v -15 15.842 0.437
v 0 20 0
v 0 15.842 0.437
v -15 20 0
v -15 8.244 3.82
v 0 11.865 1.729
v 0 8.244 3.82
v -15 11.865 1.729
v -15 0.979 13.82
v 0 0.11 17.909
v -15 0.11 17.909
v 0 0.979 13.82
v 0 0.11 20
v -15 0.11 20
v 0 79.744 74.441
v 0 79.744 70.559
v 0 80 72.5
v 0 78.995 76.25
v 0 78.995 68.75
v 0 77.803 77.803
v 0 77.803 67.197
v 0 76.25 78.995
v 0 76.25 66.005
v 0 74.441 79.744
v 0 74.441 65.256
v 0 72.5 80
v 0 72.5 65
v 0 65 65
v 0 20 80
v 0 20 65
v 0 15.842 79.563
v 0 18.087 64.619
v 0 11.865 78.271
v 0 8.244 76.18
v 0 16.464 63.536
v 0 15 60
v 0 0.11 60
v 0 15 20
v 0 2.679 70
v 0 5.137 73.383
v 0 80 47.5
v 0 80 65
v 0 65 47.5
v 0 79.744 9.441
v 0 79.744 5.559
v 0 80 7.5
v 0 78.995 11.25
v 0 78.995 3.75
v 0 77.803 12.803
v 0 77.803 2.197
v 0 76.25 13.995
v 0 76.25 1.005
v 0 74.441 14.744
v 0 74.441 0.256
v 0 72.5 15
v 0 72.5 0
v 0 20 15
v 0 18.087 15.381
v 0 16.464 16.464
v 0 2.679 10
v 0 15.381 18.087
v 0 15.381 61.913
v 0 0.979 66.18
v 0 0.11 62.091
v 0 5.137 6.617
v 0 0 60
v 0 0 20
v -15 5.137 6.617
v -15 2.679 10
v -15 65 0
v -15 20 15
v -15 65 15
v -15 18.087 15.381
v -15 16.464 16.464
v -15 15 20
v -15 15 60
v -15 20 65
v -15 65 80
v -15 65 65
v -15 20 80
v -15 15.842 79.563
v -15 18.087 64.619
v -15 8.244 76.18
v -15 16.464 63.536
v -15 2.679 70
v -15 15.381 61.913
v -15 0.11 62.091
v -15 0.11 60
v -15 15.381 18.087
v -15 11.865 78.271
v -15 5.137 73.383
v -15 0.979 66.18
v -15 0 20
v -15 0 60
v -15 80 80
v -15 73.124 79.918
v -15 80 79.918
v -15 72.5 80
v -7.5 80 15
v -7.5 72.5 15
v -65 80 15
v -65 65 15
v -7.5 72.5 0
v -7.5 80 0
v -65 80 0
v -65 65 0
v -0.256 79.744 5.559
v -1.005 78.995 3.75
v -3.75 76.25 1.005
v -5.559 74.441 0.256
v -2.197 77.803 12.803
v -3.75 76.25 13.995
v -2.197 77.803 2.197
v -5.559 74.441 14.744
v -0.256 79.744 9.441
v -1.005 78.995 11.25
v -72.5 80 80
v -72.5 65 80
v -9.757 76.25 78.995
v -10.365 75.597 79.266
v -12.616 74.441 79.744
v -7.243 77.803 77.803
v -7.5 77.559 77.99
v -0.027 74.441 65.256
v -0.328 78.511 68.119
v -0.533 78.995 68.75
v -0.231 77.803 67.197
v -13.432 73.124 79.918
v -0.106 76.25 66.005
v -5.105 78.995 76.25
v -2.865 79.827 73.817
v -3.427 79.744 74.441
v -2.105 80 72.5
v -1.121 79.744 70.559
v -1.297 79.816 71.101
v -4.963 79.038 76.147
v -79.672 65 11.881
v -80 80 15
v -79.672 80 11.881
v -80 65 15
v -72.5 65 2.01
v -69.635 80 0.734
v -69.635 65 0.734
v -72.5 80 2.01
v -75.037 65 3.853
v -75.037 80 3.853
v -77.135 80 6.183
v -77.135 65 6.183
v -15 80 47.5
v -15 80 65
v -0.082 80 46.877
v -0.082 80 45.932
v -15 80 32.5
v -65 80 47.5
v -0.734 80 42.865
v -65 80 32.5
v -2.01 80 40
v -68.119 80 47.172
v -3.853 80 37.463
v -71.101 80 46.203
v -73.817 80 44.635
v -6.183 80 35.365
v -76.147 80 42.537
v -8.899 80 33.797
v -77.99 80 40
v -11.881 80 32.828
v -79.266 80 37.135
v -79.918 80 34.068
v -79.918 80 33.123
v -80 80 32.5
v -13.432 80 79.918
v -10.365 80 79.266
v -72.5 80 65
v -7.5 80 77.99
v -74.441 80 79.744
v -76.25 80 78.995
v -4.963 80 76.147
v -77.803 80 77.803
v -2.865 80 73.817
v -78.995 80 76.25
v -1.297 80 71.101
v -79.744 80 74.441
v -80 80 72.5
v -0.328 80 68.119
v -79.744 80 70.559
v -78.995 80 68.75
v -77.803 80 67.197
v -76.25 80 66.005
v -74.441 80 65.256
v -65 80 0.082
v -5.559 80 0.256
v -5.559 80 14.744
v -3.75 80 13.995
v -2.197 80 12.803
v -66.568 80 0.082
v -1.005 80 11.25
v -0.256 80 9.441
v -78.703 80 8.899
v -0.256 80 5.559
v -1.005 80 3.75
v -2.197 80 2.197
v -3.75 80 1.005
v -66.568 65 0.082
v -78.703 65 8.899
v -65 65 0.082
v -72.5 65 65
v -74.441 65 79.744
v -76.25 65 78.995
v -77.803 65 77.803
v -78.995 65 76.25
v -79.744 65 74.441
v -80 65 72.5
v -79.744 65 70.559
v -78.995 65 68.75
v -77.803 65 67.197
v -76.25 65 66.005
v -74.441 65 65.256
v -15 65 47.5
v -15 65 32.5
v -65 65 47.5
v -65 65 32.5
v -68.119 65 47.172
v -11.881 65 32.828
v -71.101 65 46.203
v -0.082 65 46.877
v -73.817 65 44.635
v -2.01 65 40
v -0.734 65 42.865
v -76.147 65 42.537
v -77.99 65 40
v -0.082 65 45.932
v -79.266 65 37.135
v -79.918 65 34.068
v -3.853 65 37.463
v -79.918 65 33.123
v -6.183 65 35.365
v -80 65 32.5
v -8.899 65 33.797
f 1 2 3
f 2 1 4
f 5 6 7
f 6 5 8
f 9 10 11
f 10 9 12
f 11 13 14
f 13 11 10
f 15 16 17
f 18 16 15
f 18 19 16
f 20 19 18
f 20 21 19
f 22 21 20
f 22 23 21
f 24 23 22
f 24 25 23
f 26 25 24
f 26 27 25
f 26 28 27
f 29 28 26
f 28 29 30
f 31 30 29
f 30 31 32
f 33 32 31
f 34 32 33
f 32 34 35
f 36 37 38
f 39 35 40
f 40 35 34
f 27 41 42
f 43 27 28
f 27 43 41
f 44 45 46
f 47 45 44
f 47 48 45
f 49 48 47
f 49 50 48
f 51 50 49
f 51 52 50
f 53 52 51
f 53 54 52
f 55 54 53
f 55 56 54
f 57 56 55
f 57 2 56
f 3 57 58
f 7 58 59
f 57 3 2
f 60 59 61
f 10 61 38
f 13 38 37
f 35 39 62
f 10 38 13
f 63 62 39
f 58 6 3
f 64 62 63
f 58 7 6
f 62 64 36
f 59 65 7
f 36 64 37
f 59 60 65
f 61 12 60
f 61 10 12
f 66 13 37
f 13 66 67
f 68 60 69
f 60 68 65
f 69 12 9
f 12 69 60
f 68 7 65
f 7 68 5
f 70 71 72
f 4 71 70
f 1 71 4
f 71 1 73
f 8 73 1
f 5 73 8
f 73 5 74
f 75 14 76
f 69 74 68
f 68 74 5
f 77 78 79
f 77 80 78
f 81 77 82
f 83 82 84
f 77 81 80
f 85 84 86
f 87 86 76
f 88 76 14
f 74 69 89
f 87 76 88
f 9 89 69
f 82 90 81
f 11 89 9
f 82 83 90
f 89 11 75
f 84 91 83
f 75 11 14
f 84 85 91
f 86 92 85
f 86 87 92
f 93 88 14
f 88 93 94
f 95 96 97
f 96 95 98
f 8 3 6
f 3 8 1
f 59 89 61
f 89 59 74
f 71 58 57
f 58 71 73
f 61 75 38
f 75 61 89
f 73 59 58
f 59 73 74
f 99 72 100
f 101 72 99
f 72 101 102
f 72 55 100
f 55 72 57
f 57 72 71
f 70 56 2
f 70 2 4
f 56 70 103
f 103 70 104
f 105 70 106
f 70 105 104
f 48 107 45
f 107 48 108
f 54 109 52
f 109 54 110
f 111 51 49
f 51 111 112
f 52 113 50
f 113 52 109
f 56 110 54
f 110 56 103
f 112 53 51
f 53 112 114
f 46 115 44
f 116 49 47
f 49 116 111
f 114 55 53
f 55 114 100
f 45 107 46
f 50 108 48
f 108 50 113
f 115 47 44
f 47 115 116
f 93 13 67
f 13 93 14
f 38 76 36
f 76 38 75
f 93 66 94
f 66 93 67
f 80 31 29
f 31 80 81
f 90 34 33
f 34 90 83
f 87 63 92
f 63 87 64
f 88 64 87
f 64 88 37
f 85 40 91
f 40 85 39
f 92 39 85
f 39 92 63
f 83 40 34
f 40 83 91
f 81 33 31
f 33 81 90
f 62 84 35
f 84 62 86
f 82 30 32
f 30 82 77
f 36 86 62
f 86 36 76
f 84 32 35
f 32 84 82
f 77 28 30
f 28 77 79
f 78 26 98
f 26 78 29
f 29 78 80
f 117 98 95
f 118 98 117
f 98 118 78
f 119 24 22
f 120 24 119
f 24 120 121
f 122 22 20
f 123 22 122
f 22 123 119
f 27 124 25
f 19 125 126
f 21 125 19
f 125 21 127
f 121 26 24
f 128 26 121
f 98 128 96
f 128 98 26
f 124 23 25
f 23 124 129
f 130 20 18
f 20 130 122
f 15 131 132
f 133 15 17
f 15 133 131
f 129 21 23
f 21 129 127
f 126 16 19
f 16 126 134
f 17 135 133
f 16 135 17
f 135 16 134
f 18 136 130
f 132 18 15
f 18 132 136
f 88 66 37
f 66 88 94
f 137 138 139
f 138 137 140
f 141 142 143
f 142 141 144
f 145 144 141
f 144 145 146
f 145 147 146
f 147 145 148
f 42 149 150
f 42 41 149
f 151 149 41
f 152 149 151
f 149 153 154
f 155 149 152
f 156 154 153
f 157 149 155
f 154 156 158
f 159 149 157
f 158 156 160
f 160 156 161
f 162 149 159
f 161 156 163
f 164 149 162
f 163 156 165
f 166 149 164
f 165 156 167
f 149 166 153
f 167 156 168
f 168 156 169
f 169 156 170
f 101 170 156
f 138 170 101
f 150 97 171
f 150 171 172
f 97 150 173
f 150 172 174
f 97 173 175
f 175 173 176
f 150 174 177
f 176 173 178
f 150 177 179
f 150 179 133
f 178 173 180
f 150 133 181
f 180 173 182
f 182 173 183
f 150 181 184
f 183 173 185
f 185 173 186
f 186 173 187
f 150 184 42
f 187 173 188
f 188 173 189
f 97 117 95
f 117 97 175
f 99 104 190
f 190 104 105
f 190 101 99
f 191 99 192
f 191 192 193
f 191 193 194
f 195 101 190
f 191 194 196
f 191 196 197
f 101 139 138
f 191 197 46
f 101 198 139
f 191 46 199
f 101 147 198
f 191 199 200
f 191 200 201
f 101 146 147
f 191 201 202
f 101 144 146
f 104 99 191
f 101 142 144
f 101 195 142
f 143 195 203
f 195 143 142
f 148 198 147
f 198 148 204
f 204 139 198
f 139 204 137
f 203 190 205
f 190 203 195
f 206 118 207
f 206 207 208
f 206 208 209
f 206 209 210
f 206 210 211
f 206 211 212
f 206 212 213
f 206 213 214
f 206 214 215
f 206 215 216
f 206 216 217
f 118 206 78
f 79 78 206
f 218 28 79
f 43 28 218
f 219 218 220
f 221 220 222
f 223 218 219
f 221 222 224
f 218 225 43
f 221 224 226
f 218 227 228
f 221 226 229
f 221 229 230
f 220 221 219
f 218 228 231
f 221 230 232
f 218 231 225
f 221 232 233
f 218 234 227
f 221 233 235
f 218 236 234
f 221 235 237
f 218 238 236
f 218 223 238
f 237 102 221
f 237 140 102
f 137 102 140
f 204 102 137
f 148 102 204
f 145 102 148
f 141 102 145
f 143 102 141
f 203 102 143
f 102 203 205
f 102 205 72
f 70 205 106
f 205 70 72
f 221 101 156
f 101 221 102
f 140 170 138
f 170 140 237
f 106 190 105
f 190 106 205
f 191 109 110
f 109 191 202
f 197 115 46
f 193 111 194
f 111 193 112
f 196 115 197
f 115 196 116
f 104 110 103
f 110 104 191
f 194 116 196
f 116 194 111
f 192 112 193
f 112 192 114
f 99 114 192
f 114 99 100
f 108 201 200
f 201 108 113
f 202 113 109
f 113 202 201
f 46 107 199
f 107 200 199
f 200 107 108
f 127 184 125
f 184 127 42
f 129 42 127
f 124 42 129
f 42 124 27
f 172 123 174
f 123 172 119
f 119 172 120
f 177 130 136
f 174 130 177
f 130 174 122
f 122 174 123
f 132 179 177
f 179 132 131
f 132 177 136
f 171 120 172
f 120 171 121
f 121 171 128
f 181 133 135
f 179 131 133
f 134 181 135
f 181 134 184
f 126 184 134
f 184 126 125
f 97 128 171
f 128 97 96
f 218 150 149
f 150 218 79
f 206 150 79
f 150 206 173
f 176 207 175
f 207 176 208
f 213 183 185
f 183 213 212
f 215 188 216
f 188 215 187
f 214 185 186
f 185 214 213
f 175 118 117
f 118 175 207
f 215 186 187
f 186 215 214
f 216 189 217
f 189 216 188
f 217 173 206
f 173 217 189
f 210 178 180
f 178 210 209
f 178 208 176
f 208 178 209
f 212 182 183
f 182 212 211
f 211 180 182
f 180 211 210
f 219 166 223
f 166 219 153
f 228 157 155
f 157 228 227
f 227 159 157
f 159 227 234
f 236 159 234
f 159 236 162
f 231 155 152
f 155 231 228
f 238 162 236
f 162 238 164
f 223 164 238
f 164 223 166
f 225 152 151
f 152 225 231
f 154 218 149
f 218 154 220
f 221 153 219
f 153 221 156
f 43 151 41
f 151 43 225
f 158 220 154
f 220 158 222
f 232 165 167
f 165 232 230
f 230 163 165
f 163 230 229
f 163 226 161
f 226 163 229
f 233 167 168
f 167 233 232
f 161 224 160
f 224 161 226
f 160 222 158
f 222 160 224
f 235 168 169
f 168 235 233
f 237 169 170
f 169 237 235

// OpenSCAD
CUBE_SIZE=80;
LETTER_THICK=15;


// Letter will go up in +Z, out in +Y, thick in -X
module LetterL(letterHeight, letterWidth, letterThick, curveRadius)
{
  // Straight length parts (not the curve, not the rounded end)
  straightLengthBottom = letterWidth - curveRadius - letterThick / 2;
  straightLengthTop    = letterHeight - curveRadius - letterThick / 2;
  
  // Bottom part
  translate([-letterThick, curveRadius, 0])
    cube([letterThick, straightLengthBottom, letterThick]);
  
  translate([-letterThick, curveRadius + straightLengthBottom, letterThick / 2])
    rotate(a=90, v=[0,1,0])
      cylinder(h=letterThick, r=(letterThick / 2)); 
  
  // Top part
  translate([-letterThick, 0, curveRadius])
    cube([letterThick, letterThick, straightLengthTop]);
  
  translate([-letterThick, letterThick / 2, curveRadius + straightLengthTop])
    rotate(a=90, v=[0,1,0])
      cylinder(h=letterThick, r=(letterThick / 2));
  
  // Big radius
  intersection()
  {
    translate([-letterThick, 0, 0])
      cube([letterThick, curveRadius + .0001, curveRadius + .0001]);
    
    difference()
    {
    translate([-letterThick, curveRadius, curveRadius])
      rotate(a=90, v=[0,1,0])
        cylinder(h=letterThick, r=curveRadius);
      
    translate([-letterThick-.5, curveRadius, curveRadius])
      rotate(a=90, v=[0,1,0])
        cylinder(h=letterThick+1, r=curveRadius - letterThick);
      
    }    
  }
}


module LetterC(letterSize, letterThick, curveRadius) 
{
  // Letter will be in Y and Z planes.  Thickness from X=0 towards negative X.
  bottomHeight = letterSize / 2 + letterThick;
  LetterL(bottomHeight, letterSize, letterThick, curveRadius);
  
  translate([-letterThick, 0, letterSize])
    rotate(a=180, v=[0,1,0])
      LetterL(bottomHeight, letterSize, letterThick, curveRadius);
  
}

module LetterS(letterSize, letterThick, curveRadius) 
{
  // There are 4 L's in an S (top, left, right, bottom)
  // top and bottom are the same size
  // left and right are the same size
  
  TB_width = curveRadius + letterThick / 2 + .1;
  TB_height = letterSize;
  
  translate([0, letterSize, 0])
    rotate(a=90, v=[1,0,0])
      LetterL(TB_height, TB_width, letterThick, curveRadius);
  
  translate([0, 0, letterSize])
    rotate(a=90, v=[-1,0,0])
      LetterL(TB_height, TB_width, letterThick, curveRadius);
  
  LR_width = letterSize / 2 + letterThick / 2 + .001;
  LR_height = curveRadius + letterThick / 2 + .001;
  
  translate([0,0,letterSize/2 - letterThick / 2])
  LetterL(LR_height, LR_width, letterThick, curveRadius);
  
  translate([0, letterSize, letterSize / 2 + letterThick / 2])
  rotate(a=180, v=[1,0,0])
  LetterL(LR_height, LR_width, letterThick, curveRadius);
  
  // There are also little sections that join bottom to the LR, and top to the LR
  littleSectsHeight = (letterSize - ( curveRadius * 4 - letterThick) ) / 2;
  echo("Little Sects Height = ", littleSectsHeight);
  
  translate([-letterThick, letterSize - letterThick, curveRadius])
    cube([letterThick, letterThick, littleSectsHeight]);
    
  translate([-letterThick, 0, letterSize / 2 - letterThick / 2 + curveRadius])
    cube([letterThick, letterThick, littleSectsHeight]);
  
  /**
  // Letter will be in Y and Z planes.  Thickness from X=0 towards negative X.
  bottomHeight = letterSize / 2 + letterThick;
  LetterL(bottomHeight, letterSize, letterThick, curveRadius);
  
  translate([-letterThick, 0, letterSize])
    rotate(a=180, v=[0,1,0])
      LetterL(bottomHeight, letterSize, letterThick, curveRadius);
  **/
}


LetterC(CUBE_SIZE, LETTER_THICK, 20);

translate([0, CUBE_SIZE, 0])
  rotate(a=90, v=[0,0,1])
    LetterS(CUBE_SIZE, LETTER_THICK, 15);
